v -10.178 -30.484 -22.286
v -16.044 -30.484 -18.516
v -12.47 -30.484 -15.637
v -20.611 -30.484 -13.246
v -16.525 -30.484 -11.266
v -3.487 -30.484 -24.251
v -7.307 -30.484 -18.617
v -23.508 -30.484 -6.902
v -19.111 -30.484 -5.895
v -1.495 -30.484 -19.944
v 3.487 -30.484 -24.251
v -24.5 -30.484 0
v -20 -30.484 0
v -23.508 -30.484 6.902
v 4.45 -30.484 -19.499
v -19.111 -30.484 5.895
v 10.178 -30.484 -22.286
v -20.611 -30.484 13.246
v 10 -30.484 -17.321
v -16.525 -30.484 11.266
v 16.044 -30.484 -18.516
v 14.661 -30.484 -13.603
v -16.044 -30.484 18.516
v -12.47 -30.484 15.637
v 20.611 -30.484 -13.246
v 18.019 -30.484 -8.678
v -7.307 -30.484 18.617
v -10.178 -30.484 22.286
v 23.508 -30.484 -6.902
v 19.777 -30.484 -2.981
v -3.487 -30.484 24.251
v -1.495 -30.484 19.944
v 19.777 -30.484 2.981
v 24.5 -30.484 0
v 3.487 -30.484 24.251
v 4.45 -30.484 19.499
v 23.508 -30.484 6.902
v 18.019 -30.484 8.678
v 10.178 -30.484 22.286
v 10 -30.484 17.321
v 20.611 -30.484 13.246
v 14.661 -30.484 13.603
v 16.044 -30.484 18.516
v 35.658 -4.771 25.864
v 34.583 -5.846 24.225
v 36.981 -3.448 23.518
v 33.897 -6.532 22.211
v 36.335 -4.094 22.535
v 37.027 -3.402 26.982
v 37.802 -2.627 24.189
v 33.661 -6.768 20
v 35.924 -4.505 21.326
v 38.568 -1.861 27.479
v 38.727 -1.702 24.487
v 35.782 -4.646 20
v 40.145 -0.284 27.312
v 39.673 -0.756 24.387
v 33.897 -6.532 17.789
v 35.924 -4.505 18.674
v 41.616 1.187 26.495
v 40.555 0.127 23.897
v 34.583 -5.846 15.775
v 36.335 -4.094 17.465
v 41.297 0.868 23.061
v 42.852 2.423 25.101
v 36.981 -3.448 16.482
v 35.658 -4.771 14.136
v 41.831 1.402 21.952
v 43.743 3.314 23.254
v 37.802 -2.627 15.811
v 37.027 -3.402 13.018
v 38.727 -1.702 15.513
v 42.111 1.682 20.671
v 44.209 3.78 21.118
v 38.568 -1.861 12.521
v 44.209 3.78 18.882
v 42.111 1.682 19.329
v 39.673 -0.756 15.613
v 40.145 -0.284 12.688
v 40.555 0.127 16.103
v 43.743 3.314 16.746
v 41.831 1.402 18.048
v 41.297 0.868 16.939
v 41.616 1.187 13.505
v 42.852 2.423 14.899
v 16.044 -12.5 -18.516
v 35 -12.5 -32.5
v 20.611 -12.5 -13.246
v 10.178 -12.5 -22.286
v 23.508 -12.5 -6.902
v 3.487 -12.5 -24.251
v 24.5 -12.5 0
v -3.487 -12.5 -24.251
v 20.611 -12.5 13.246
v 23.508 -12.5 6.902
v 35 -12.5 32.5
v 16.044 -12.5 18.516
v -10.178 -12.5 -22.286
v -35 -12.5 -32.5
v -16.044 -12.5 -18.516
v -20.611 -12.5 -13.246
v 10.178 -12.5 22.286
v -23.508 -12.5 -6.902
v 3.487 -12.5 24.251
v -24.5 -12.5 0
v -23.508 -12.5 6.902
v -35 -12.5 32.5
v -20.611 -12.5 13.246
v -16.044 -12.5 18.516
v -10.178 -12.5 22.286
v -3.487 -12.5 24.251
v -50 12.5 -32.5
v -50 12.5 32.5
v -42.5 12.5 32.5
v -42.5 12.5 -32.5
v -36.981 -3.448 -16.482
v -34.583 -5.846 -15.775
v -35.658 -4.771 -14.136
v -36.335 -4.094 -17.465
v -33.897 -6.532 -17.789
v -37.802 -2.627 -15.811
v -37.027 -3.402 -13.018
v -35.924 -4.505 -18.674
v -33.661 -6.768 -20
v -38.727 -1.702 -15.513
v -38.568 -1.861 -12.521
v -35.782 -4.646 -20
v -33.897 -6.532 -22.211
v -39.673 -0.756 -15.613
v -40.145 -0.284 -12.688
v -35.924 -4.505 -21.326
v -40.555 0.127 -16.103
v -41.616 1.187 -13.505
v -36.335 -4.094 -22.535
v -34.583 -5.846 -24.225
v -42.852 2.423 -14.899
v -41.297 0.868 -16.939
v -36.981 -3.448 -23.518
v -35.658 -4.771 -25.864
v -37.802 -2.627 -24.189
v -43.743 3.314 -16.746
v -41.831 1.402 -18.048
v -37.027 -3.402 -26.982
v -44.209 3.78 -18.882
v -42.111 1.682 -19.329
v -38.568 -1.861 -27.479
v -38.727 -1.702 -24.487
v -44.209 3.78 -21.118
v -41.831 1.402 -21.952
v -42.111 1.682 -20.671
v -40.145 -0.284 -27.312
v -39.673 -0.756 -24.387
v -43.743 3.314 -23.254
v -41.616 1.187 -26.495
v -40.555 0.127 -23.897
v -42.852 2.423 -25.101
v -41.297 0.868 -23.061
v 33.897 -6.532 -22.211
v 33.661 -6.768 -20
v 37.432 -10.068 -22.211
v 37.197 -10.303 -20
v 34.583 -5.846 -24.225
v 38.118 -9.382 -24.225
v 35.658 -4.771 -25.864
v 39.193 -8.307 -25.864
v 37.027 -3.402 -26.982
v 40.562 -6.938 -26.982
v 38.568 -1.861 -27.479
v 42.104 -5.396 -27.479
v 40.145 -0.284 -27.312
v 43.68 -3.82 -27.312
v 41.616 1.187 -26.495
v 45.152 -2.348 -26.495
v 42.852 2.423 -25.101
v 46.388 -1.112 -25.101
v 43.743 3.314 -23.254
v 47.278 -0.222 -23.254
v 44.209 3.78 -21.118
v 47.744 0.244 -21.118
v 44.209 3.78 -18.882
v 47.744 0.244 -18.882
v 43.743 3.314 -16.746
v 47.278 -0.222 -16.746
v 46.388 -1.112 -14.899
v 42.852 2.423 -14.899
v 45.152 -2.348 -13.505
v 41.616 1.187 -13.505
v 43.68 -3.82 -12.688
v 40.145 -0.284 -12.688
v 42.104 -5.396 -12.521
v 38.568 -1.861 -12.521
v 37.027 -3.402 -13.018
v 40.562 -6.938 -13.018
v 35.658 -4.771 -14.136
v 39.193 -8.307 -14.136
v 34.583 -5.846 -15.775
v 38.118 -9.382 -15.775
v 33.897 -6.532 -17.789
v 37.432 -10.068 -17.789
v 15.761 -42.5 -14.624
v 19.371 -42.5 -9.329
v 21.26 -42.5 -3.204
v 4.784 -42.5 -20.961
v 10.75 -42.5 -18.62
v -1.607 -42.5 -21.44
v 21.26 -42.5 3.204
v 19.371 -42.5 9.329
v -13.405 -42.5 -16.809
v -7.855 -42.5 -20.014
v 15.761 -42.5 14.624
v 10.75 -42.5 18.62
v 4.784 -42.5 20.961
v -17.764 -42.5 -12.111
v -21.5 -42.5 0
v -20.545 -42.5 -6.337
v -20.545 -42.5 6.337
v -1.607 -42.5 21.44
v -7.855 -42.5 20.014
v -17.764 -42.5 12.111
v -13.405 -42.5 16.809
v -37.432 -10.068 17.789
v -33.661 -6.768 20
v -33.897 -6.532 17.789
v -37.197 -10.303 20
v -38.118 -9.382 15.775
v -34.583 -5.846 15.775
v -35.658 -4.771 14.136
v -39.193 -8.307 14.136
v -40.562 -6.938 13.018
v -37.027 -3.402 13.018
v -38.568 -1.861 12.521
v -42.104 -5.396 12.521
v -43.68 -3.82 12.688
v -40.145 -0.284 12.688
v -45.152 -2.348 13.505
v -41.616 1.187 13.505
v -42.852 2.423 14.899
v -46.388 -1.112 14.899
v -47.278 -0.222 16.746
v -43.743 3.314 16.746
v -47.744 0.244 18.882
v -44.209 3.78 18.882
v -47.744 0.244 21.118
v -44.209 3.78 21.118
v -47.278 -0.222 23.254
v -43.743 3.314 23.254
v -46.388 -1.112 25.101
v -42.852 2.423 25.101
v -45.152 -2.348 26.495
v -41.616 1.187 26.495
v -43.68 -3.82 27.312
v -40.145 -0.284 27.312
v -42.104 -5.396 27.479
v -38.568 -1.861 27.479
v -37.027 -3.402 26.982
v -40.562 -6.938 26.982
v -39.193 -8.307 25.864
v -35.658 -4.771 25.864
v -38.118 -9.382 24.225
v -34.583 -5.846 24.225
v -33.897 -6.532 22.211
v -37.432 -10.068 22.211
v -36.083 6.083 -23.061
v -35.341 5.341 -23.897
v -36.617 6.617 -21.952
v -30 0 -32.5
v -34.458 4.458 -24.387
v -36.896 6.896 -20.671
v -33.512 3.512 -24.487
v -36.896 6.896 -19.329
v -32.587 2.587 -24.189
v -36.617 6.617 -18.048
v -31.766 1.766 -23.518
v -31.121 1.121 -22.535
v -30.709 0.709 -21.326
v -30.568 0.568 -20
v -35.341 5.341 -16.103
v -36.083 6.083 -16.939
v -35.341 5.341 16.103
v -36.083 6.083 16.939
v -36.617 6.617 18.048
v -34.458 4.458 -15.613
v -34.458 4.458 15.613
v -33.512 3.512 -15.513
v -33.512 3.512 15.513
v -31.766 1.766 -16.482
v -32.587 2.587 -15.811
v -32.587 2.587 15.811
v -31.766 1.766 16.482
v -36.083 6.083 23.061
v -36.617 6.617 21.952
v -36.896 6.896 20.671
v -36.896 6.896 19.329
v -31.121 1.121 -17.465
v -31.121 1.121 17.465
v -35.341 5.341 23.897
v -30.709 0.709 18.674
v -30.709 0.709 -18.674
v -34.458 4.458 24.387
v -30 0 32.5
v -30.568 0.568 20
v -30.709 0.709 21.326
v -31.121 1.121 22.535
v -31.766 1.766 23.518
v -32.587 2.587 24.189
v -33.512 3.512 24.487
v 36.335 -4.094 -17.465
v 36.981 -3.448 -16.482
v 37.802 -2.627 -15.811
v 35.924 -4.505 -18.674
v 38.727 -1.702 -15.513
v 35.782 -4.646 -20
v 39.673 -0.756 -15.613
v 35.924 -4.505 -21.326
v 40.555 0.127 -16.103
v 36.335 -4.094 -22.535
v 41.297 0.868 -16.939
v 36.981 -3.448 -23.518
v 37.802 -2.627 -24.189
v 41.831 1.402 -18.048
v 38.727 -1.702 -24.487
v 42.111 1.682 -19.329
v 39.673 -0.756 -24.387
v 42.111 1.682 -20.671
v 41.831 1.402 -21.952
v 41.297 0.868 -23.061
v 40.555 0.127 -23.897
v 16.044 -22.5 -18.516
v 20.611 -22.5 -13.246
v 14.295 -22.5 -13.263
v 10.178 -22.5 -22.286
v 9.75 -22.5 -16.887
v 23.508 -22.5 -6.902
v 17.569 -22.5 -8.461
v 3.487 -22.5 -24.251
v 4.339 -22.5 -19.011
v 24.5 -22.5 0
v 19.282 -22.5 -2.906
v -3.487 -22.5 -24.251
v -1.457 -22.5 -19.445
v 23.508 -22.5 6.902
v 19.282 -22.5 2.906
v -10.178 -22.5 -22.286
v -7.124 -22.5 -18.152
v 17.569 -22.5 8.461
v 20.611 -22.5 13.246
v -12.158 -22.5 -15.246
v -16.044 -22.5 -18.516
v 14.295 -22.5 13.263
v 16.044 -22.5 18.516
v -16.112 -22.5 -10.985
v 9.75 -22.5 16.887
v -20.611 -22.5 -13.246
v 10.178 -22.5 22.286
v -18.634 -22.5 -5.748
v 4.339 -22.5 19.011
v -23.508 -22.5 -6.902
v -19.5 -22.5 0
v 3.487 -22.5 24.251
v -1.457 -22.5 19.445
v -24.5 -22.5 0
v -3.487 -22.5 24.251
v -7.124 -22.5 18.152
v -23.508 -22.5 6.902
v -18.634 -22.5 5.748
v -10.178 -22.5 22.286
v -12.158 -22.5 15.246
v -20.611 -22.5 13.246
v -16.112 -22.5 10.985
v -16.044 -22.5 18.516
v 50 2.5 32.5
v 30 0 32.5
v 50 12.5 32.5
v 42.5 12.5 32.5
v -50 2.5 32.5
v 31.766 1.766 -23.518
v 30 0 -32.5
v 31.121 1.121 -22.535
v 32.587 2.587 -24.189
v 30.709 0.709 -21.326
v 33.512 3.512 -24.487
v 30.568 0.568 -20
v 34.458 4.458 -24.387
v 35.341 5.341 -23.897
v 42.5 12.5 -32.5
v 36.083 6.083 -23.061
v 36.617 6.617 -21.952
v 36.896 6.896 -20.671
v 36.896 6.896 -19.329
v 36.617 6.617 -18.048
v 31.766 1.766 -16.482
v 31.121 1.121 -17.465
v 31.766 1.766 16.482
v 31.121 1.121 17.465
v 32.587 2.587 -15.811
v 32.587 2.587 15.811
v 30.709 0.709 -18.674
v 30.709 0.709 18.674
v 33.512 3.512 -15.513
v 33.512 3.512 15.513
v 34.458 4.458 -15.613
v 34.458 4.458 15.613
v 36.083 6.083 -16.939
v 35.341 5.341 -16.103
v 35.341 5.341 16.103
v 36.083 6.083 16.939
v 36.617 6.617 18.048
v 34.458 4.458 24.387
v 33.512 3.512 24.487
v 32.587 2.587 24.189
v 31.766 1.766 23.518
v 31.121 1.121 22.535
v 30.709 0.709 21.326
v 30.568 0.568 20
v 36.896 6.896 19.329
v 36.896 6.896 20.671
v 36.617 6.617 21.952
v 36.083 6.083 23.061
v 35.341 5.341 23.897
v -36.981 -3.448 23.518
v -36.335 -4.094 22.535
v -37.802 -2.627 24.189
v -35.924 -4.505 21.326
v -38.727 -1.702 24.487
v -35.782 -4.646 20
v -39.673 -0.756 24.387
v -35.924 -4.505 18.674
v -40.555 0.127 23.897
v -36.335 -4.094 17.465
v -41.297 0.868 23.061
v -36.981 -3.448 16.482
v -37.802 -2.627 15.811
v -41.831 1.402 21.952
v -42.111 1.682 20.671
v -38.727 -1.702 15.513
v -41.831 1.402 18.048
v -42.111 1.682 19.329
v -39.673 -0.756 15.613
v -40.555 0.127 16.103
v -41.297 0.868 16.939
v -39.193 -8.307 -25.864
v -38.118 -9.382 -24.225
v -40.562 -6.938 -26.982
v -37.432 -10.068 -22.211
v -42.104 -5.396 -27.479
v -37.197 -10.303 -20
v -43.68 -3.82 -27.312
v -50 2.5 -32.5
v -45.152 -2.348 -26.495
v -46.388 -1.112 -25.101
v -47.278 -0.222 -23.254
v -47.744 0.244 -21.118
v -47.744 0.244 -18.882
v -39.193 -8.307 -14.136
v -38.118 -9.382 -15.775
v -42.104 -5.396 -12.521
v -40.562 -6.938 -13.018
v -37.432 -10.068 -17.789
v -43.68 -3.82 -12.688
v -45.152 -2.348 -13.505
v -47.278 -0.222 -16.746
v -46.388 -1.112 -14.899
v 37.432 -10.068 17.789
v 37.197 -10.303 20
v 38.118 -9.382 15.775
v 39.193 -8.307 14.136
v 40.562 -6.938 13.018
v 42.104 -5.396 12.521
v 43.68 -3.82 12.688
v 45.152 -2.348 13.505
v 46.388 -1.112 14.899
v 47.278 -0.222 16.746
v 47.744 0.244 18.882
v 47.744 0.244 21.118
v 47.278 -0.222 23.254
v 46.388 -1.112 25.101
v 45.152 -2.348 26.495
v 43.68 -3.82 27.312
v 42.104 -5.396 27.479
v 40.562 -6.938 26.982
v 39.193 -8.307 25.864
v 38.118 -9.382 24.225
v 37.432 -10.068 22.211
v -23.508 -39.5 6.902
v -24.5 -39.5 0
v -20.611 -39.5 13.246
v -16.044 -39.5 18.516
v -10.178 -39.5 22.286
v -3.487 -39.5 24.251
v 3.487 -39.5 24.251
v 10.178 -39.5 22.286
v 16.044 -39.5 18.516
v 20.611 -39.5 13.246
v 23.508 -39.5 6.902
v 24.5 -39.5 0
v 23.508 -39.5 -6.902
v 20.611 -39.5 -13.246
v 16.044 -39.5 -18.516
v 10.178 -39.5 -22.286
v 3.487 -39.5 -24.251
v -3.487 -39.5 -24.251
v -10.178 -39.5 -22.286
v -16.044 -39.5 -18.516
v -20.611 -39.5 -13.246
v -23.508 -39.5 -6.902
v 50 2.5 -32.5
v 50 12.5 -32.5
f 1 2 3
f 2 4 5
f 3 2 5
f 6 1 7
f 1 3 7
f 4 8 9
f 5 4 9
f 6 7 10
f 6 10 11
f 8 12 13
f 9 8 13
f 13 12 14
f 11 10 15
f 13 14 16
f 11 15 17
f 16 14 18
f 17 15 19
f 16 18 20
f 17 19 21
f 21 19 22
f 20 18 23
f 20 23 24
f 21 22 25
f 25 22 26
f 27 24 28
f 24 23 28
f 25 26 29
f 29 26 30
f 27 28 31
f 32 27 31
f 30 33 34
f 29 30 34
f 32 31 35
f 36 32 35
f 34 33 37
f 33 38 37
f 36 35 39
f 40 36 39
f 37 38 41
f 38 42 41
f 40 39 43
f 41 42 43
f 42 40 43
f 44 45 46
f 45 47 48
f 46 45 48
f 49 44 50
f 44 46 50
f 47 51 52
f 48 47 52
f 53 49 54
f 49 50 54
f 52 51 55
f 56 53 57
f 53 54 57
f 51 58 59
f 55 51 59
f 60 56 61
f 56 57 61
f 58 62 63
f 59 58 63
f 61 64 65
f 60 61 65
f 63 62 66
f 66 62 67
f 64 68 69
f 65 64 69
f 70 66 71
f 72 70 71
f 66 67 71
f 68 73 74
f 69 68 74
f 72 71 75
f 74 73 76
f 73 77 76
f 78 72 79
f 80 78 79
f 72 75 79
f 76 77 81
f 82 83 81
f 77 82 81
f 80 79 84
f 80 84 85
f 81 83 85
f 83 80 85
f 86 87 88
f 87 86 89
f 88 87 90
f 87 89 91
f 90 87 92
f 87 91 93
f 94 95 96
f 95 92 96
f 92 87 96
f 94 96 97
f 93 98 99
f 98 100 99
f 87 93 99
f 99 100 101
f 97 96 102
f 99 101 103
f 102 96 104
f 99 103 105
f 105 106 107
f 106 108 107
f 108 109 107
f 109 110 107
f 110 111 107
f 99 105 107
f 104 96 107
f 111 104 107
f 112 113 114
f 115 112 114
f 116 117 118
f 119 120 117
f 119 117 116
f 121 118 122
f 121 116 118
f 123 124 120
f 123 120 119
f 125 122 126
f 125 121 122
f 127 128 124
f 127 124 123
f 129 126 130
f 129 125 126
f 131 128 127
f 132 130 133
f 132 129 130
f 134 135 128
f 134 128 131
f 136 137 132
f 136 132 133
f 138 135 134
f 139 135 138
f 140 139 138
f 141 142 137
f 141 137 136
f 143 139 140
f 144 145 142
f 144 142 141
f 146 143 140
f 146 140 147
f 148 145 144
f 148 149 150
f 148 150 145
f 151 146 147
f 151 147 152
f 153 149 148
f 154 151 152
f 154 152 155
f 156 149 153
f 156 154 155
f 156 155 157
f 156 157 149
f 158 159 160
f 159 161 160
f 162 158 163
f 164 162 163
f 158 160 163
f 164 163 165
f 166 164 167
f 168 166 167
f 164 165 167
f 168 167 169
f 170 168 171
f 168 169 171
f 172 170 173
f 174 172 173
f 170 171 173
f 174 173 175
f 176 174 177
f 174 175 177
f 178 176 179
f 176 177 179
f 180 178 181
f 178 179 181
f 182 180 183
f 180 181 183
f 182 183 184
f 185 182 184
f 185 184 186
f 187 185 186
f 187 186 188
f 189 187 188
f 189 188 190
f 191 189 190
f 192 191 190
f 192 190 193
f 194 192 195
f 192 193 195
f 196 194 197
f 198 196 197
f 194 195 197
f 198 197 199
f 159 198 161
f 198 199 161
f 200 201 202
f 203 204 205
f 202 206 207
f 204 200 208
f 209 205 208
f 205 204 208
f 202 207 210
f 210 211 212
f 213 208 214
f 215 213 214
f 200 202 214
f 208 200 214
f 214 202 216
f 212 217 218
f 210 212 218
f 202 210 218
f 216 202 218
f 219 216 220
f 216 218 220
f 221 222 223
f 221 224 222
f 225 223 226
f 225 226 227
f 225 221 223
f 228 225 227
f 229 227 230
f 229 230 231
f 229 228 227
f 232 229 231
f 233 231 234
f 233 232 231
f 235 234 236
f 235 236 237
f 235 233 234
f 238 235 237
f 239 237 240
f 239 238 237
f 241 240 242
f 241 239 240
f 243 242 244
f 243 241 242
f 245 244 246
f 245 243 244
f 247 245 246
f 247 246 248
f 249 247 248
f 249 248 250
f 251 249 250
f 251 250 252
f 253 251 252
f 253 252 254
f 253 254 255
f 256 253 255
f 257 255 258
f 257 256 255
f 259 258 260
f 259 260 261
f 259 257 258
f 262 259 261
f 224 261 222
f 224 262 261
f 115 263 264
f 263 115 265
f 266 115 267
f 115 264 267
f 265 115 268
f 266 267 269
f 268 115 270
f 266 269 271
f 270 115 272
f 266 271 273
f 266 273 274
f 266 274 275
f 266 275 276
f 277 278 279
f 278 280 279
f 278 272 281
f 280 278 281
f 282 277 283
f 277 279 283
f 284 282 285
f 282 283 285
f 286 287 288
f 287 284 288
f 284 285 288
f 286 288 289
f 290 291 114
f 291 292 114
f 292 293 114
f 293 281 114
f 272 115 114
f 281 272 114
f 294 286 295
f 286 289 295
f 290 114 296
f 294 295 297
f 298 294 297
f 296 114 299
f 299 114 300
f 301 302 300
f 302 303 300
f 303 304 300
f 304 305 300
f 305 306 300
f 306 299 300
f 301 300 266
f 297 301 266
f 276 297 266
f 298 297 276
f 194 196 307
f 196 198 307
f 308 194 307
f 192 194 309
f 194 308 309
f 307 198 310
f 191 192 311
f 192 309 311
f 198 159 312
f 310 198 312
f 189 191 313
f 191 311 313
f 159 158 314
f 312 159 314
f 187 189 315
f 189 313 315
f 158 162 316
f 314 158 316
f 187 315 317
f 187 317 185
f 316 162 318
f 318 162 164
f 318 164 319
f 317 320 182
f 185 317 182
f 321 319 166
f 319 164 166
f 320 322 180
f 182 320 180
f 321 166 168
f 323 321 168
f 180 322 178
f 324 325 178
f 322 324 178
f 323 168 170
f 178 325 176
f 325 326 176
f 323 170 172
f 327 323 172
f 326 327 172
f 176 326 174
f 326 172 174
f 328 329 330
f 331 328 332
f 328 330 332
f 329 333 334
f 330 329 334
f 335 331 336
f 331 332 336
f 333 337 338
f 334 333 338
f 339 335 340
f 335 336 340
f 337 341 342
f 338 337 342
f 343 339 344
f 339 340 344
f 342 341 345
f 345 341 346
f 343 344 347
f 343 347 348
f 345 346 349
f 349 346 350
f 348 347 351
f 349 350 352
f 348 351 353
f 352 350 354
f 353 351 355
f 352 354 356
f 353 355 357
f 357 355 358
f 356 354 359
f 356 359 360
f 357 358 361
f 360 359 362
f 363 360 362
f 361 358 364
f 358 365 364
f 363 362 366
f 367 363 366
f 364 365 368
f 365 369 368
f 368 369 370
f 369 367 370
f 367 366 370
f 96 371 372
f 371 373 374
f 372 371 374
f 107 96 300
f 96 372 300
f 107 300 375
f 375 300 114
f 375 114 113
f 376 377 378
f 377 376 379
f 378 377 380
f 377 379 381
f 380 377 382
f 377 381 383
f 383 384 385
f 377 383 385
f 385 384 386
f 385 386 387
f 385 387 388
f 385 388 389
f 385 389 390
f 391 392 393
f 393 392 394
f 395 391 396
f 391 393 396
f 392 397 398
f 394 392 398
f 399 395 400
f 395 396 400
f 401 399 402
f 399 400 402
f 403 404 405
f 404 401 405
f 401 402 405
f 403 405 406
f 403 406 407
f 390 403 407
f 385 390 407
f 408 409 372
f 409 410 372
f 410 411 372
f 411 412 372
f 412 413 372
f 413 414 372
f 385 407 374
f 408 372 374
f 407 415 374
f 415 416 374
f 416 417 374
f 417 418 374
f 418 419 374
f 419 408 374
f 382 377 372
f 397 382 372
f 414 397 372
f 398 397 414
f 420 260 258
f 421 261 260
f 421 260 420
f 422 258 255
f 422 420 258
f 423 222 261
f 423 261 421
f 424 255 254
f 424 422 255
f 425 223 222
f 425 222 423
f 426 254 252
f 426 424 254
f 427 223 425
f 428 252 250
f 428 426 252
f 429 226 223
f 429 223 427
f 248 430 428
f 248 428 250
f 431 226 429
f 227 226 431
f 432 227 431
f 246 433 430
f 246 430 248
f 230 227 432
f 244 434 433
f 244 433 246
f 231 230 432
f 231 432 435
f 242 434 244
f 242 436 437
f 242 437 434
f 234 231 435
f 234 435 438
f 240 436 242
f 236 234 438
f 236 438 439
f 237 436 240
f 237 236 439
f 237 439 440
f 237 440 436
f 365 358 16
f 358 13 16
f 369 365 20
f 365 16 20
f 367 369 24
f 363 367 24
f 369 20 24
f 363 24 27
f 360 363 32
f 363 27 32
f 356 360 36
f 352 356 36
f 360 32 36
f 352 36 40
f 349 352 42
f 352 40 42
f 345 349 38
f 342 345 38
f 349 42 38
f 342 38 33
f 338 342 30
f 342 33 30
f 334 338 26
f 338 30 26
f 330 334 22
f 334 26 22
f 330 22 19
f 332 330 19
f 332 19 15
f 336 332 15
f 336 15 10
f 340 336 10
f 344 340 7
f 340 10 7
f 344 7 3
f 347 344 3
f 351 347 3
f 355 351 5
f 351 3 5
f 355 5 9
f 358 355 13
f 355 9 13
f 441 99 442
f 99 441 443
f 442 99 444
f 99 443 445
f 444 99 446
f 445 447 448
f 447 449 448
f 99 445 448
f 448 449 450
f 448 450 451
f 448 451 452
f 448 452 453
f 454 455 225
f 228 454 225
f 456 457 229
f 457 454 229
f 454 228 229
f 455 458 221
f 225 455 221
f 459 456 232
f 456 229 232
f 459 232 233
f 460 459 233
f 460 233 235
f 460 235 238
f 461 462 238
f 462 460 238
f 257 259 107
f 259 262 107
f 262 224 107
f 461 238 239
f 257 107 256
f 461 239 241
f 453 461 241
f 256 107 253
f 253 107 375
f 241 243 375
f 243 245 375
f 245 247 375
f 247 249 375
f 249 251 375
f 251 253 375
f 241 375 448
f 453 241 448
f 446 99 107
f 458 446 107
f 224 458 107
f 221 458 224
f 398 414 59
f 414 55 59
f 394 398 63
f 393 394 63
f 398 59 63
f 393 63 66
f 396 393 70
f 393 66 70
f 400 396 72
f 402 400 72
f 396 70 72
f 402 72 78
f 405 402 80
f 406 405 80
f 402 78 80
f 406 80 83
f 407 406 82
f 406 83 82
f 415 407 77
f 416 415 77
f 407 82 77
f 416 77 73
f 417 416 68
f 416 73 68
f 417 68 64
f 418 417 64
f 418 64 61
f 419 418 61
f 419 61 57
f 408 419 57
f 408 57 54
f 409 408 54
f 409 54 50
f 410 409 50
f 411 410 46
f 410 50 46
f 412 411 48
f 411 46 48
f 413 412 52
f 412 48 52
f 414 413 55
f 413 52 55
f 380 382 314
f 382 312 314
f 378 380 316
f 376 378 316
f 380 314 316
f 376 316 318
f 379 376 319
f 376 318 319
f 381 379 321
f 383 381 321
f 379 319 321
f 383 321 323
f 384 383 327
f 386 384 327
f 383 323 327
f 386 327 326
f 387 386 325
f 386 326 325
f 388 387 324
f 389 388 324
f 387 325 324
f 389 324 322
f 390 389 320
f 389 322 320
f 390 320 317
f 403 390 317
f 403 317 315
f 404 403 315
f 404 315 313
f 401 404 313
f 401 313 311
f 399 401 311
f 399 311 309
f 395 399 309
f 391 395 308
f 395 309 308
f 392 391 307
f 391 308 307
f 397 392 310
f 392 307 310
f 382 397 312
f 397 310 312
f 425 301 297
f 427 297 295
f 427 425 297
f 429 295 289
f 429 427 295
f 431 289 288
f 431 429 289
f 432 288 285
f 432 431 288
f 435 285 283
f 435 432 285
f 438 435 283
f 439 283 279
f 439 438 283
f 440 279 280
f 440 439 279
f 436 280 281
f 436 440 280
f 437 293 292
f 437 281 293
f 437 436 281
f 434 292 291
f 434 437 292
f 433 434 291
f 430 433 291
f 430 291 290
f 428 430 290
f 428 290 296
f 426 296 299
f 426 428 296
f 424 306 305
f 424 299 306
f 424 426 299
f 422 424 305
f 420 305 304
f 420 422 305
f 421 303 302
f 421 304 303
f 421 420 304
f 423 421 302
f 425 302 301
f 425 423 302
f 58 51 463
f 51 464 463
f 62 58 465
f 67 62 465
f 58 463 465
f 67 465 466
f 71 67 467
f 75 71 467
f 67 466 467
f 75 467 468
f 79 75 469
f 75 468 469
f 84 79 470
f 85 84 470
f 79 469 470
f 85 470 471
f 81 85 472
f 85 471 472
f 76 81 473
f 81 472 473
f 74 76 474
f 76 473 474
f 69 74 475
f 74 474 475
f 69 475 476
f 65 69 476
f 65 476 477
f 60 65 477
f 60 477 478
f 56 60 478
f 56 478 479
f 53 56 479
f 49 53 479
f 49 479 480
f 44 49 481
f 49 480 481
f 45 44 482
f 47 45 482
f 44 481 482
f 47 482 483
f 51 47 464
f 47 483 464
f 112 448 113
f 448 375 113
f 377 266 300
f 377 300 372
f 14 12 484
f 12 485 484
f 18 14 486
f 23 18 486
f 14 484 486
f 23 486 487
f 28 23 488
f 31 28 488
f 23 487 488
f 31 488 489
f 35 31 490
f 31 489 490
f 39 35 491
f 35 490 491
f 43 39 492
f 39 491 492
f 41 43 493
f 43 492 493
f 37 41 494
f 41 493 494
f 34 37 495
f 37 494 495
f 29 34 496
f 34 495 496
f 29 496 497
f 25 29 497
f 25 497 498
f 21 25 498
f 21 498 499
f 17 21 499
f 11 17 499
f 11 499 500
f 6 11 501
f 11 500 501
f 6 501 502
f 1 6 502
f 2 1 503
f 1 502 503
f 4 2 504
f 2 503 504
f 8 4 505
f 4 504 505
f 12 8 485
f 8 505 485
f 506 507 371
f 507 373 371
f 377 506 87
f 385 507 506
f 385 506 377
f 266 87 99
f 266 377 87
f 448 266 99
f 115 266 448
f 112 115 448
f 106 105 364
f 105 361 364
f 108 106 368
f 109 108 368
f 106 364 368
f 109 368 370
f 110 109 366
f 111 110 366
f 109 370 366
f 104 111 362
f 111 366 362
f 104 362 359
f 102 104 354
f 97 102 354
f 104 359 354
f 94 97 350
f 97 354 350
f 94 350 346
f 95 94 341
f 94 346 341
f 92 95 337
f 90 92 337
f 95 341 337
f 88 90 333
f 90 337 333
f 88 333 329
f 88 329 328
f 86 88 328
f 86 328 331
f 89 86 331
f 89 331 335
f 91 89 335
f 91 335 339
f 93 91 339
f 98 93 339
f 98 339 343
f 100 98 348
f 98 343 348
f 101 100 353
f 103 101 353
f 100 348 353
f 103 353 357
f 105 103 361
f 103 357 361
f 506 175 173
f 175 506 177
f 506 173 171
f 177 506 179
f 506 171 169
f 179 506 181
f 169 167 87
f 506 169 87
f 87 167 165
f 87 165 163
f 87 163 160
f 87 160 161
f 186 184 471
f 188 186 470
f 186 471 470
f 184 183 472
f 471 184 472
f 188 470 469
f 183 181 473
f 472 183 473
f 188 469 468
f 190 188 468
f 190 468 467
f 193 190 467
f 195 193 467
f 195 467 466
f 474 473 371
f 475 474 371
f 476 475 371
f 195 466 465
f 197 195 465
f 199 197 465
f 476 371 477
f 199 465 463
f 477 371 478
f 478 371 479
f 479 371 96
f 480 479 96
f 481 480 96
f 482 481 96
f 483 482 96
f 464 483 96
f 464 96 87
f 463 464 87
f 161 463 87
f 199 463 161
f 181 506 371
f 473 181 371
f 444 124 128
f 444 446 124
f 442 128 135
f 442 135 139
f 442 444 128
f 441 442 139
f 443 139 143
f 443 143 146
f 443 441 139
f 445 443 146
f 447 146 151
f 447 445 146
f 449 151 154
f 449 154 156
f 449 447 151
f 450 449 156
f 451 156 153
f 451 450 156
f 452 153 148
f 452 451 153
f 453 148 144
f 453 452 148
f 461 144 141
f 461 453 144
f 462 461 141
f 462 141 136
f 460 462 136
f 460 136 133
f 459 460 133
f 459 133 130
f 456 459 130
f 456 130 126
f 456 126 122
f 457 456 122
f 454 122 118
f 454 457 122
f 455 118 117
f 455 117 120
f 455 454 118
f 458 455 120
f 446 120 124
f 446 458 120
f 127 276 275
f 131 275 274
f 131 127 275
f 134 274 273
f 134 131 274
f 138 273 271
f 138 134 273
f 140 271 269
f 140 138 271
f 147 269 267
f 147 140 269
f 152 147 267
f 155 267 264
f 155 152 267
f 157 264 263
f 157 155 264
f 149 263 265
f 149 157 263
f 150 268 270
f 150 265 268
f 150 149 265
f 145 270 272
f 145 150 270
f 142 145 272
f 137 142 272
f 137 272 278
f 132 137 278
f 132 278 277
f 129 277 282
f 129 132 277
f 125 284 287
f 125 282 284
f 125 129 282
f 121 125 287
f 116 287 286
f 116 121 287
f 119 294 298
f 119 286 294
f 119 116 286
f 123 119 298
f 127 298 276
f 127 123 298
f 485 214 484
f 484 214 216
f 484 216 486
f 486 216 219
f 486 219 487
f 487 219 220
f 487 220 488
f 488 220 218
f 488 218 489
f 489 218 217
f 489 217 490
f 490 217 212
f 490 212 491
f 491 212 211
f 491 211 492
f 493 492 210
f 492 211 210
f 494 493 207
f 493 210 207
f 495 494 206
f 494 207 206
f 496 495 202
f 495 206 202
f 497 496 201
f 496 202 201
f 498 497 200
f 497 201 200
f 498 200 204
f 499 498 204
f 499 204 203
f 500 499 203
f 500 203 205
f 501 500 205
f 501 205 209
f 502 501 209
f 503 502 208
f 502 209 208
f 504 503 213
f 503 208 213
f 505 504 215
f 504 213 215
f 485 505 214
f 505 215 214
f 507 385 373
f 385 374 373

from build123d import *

# Parameters (mm, degrees)
SALIENTE_EXTRUIR1_DEPTH                     = 32.5
REFRENTADO_PARA_TORNILLO_CON_CABEZA_2_COUNT = 2
REFRENTADO_PARA_TORNILLO_CON_CABEZA_2_PITCH = 40


with BuildPart() as part:
    # Croquis2 → Saliente-Extruir1 (new body, symmetric)
    with BuildSketch(Plane.XY):
        Polygon((-30, 0), (30, 0), (42.5, 12.5), (50, 12.5), (50, 2.5), (35, -12.5), (-35, -12.5), (-50, 2.5), (-50, 12.5), (-42.5, 12.5), align=None)
    extrude(amount=SALIENTE_EXTRUIR1_DEPTH, both=True)

    # Croquis3 → Revolución1 (revolve)
    with BuildSketch(Plane.XY):
        Polygon((0, -12.5), (-24.5, -12.5), (-24.5, -22.5), (-19.5, -22.5), (-20, -30.484359711), (-24.5, -30.484359711), (-24.5, -39.5), (-21.5, -42.5), (0, -42.5), align=None)
    revolve(axis=Axis((0, -42.5, 0), (0, 1, 0)))

    # Croquis5 → Refrentado para tornillo con cabeza plana de M81 (revolve, cut)
    with BuildSketch(Plane(origin=(-42.5, -5, -20), x_dir=(0.707106781, -0.707106781, 0), z_dir=(0, 0, 1))):
        Polygon((0, 0), (0, 77.781745931), (4.5, 77.781745931), (4.5, 5), (7.5, 5), (7.5, 0), align=None)
    refrentado_para_tornillo_con_cabeza_plan = revolve(axis=Axis((-46.990128061, -9.490128061, -20), (0.707106781, 0.707106781, 0)), mode=Mode.SUBTRACT)

    # Refrentado para tornillo con cabeza  2: Refrentado para tornillo con cabeza plana de M81 ×2
    with Locations(*[(0, 0, i * REFRENTADO_PARA_TORNILLO_CON_CABEZA_2_PITCH) for i in range(1, REFRENTADO_PARA_TORNILLO_CON_CABEZA_2_COUNT)]):
        add(refrentado_para_tornillo_con_cabeza_plan, mode=Mode.SUBTRACT)

    # Simetría1: Refrentado para tornillo con cabeza plana de M81 across plane
    add(refrentado_para_tornillo_con_cabeza_plan.mirror(Plane(origin=(0, 0, 0), x_dir=(0, 0, 1), z_dir=(1, 0, 0))), mode=Mode.SUBTRACT)

    # Simetría1 copy 1 sketch → Simetría1 copy 1 (revolve, cut)
    with BuildSketch(Plane(origin=(42.5, -5, 20), x_dir=(-0.707106781, -0.707106781, 0), z_dir=(0, 0, 1))):
        Polygon((0, 0), (0, -77.781745931), (4.5, -77.781745931), (4.5, -5), (7.5, -5), (7.5, 0), align=None)
    revolve(axis=Axis((46.990128061, -9.490128061, 20), (0.707106781, -0.707106781, 0)), mode=Mode.SUBTRACT)


solid = part.part
